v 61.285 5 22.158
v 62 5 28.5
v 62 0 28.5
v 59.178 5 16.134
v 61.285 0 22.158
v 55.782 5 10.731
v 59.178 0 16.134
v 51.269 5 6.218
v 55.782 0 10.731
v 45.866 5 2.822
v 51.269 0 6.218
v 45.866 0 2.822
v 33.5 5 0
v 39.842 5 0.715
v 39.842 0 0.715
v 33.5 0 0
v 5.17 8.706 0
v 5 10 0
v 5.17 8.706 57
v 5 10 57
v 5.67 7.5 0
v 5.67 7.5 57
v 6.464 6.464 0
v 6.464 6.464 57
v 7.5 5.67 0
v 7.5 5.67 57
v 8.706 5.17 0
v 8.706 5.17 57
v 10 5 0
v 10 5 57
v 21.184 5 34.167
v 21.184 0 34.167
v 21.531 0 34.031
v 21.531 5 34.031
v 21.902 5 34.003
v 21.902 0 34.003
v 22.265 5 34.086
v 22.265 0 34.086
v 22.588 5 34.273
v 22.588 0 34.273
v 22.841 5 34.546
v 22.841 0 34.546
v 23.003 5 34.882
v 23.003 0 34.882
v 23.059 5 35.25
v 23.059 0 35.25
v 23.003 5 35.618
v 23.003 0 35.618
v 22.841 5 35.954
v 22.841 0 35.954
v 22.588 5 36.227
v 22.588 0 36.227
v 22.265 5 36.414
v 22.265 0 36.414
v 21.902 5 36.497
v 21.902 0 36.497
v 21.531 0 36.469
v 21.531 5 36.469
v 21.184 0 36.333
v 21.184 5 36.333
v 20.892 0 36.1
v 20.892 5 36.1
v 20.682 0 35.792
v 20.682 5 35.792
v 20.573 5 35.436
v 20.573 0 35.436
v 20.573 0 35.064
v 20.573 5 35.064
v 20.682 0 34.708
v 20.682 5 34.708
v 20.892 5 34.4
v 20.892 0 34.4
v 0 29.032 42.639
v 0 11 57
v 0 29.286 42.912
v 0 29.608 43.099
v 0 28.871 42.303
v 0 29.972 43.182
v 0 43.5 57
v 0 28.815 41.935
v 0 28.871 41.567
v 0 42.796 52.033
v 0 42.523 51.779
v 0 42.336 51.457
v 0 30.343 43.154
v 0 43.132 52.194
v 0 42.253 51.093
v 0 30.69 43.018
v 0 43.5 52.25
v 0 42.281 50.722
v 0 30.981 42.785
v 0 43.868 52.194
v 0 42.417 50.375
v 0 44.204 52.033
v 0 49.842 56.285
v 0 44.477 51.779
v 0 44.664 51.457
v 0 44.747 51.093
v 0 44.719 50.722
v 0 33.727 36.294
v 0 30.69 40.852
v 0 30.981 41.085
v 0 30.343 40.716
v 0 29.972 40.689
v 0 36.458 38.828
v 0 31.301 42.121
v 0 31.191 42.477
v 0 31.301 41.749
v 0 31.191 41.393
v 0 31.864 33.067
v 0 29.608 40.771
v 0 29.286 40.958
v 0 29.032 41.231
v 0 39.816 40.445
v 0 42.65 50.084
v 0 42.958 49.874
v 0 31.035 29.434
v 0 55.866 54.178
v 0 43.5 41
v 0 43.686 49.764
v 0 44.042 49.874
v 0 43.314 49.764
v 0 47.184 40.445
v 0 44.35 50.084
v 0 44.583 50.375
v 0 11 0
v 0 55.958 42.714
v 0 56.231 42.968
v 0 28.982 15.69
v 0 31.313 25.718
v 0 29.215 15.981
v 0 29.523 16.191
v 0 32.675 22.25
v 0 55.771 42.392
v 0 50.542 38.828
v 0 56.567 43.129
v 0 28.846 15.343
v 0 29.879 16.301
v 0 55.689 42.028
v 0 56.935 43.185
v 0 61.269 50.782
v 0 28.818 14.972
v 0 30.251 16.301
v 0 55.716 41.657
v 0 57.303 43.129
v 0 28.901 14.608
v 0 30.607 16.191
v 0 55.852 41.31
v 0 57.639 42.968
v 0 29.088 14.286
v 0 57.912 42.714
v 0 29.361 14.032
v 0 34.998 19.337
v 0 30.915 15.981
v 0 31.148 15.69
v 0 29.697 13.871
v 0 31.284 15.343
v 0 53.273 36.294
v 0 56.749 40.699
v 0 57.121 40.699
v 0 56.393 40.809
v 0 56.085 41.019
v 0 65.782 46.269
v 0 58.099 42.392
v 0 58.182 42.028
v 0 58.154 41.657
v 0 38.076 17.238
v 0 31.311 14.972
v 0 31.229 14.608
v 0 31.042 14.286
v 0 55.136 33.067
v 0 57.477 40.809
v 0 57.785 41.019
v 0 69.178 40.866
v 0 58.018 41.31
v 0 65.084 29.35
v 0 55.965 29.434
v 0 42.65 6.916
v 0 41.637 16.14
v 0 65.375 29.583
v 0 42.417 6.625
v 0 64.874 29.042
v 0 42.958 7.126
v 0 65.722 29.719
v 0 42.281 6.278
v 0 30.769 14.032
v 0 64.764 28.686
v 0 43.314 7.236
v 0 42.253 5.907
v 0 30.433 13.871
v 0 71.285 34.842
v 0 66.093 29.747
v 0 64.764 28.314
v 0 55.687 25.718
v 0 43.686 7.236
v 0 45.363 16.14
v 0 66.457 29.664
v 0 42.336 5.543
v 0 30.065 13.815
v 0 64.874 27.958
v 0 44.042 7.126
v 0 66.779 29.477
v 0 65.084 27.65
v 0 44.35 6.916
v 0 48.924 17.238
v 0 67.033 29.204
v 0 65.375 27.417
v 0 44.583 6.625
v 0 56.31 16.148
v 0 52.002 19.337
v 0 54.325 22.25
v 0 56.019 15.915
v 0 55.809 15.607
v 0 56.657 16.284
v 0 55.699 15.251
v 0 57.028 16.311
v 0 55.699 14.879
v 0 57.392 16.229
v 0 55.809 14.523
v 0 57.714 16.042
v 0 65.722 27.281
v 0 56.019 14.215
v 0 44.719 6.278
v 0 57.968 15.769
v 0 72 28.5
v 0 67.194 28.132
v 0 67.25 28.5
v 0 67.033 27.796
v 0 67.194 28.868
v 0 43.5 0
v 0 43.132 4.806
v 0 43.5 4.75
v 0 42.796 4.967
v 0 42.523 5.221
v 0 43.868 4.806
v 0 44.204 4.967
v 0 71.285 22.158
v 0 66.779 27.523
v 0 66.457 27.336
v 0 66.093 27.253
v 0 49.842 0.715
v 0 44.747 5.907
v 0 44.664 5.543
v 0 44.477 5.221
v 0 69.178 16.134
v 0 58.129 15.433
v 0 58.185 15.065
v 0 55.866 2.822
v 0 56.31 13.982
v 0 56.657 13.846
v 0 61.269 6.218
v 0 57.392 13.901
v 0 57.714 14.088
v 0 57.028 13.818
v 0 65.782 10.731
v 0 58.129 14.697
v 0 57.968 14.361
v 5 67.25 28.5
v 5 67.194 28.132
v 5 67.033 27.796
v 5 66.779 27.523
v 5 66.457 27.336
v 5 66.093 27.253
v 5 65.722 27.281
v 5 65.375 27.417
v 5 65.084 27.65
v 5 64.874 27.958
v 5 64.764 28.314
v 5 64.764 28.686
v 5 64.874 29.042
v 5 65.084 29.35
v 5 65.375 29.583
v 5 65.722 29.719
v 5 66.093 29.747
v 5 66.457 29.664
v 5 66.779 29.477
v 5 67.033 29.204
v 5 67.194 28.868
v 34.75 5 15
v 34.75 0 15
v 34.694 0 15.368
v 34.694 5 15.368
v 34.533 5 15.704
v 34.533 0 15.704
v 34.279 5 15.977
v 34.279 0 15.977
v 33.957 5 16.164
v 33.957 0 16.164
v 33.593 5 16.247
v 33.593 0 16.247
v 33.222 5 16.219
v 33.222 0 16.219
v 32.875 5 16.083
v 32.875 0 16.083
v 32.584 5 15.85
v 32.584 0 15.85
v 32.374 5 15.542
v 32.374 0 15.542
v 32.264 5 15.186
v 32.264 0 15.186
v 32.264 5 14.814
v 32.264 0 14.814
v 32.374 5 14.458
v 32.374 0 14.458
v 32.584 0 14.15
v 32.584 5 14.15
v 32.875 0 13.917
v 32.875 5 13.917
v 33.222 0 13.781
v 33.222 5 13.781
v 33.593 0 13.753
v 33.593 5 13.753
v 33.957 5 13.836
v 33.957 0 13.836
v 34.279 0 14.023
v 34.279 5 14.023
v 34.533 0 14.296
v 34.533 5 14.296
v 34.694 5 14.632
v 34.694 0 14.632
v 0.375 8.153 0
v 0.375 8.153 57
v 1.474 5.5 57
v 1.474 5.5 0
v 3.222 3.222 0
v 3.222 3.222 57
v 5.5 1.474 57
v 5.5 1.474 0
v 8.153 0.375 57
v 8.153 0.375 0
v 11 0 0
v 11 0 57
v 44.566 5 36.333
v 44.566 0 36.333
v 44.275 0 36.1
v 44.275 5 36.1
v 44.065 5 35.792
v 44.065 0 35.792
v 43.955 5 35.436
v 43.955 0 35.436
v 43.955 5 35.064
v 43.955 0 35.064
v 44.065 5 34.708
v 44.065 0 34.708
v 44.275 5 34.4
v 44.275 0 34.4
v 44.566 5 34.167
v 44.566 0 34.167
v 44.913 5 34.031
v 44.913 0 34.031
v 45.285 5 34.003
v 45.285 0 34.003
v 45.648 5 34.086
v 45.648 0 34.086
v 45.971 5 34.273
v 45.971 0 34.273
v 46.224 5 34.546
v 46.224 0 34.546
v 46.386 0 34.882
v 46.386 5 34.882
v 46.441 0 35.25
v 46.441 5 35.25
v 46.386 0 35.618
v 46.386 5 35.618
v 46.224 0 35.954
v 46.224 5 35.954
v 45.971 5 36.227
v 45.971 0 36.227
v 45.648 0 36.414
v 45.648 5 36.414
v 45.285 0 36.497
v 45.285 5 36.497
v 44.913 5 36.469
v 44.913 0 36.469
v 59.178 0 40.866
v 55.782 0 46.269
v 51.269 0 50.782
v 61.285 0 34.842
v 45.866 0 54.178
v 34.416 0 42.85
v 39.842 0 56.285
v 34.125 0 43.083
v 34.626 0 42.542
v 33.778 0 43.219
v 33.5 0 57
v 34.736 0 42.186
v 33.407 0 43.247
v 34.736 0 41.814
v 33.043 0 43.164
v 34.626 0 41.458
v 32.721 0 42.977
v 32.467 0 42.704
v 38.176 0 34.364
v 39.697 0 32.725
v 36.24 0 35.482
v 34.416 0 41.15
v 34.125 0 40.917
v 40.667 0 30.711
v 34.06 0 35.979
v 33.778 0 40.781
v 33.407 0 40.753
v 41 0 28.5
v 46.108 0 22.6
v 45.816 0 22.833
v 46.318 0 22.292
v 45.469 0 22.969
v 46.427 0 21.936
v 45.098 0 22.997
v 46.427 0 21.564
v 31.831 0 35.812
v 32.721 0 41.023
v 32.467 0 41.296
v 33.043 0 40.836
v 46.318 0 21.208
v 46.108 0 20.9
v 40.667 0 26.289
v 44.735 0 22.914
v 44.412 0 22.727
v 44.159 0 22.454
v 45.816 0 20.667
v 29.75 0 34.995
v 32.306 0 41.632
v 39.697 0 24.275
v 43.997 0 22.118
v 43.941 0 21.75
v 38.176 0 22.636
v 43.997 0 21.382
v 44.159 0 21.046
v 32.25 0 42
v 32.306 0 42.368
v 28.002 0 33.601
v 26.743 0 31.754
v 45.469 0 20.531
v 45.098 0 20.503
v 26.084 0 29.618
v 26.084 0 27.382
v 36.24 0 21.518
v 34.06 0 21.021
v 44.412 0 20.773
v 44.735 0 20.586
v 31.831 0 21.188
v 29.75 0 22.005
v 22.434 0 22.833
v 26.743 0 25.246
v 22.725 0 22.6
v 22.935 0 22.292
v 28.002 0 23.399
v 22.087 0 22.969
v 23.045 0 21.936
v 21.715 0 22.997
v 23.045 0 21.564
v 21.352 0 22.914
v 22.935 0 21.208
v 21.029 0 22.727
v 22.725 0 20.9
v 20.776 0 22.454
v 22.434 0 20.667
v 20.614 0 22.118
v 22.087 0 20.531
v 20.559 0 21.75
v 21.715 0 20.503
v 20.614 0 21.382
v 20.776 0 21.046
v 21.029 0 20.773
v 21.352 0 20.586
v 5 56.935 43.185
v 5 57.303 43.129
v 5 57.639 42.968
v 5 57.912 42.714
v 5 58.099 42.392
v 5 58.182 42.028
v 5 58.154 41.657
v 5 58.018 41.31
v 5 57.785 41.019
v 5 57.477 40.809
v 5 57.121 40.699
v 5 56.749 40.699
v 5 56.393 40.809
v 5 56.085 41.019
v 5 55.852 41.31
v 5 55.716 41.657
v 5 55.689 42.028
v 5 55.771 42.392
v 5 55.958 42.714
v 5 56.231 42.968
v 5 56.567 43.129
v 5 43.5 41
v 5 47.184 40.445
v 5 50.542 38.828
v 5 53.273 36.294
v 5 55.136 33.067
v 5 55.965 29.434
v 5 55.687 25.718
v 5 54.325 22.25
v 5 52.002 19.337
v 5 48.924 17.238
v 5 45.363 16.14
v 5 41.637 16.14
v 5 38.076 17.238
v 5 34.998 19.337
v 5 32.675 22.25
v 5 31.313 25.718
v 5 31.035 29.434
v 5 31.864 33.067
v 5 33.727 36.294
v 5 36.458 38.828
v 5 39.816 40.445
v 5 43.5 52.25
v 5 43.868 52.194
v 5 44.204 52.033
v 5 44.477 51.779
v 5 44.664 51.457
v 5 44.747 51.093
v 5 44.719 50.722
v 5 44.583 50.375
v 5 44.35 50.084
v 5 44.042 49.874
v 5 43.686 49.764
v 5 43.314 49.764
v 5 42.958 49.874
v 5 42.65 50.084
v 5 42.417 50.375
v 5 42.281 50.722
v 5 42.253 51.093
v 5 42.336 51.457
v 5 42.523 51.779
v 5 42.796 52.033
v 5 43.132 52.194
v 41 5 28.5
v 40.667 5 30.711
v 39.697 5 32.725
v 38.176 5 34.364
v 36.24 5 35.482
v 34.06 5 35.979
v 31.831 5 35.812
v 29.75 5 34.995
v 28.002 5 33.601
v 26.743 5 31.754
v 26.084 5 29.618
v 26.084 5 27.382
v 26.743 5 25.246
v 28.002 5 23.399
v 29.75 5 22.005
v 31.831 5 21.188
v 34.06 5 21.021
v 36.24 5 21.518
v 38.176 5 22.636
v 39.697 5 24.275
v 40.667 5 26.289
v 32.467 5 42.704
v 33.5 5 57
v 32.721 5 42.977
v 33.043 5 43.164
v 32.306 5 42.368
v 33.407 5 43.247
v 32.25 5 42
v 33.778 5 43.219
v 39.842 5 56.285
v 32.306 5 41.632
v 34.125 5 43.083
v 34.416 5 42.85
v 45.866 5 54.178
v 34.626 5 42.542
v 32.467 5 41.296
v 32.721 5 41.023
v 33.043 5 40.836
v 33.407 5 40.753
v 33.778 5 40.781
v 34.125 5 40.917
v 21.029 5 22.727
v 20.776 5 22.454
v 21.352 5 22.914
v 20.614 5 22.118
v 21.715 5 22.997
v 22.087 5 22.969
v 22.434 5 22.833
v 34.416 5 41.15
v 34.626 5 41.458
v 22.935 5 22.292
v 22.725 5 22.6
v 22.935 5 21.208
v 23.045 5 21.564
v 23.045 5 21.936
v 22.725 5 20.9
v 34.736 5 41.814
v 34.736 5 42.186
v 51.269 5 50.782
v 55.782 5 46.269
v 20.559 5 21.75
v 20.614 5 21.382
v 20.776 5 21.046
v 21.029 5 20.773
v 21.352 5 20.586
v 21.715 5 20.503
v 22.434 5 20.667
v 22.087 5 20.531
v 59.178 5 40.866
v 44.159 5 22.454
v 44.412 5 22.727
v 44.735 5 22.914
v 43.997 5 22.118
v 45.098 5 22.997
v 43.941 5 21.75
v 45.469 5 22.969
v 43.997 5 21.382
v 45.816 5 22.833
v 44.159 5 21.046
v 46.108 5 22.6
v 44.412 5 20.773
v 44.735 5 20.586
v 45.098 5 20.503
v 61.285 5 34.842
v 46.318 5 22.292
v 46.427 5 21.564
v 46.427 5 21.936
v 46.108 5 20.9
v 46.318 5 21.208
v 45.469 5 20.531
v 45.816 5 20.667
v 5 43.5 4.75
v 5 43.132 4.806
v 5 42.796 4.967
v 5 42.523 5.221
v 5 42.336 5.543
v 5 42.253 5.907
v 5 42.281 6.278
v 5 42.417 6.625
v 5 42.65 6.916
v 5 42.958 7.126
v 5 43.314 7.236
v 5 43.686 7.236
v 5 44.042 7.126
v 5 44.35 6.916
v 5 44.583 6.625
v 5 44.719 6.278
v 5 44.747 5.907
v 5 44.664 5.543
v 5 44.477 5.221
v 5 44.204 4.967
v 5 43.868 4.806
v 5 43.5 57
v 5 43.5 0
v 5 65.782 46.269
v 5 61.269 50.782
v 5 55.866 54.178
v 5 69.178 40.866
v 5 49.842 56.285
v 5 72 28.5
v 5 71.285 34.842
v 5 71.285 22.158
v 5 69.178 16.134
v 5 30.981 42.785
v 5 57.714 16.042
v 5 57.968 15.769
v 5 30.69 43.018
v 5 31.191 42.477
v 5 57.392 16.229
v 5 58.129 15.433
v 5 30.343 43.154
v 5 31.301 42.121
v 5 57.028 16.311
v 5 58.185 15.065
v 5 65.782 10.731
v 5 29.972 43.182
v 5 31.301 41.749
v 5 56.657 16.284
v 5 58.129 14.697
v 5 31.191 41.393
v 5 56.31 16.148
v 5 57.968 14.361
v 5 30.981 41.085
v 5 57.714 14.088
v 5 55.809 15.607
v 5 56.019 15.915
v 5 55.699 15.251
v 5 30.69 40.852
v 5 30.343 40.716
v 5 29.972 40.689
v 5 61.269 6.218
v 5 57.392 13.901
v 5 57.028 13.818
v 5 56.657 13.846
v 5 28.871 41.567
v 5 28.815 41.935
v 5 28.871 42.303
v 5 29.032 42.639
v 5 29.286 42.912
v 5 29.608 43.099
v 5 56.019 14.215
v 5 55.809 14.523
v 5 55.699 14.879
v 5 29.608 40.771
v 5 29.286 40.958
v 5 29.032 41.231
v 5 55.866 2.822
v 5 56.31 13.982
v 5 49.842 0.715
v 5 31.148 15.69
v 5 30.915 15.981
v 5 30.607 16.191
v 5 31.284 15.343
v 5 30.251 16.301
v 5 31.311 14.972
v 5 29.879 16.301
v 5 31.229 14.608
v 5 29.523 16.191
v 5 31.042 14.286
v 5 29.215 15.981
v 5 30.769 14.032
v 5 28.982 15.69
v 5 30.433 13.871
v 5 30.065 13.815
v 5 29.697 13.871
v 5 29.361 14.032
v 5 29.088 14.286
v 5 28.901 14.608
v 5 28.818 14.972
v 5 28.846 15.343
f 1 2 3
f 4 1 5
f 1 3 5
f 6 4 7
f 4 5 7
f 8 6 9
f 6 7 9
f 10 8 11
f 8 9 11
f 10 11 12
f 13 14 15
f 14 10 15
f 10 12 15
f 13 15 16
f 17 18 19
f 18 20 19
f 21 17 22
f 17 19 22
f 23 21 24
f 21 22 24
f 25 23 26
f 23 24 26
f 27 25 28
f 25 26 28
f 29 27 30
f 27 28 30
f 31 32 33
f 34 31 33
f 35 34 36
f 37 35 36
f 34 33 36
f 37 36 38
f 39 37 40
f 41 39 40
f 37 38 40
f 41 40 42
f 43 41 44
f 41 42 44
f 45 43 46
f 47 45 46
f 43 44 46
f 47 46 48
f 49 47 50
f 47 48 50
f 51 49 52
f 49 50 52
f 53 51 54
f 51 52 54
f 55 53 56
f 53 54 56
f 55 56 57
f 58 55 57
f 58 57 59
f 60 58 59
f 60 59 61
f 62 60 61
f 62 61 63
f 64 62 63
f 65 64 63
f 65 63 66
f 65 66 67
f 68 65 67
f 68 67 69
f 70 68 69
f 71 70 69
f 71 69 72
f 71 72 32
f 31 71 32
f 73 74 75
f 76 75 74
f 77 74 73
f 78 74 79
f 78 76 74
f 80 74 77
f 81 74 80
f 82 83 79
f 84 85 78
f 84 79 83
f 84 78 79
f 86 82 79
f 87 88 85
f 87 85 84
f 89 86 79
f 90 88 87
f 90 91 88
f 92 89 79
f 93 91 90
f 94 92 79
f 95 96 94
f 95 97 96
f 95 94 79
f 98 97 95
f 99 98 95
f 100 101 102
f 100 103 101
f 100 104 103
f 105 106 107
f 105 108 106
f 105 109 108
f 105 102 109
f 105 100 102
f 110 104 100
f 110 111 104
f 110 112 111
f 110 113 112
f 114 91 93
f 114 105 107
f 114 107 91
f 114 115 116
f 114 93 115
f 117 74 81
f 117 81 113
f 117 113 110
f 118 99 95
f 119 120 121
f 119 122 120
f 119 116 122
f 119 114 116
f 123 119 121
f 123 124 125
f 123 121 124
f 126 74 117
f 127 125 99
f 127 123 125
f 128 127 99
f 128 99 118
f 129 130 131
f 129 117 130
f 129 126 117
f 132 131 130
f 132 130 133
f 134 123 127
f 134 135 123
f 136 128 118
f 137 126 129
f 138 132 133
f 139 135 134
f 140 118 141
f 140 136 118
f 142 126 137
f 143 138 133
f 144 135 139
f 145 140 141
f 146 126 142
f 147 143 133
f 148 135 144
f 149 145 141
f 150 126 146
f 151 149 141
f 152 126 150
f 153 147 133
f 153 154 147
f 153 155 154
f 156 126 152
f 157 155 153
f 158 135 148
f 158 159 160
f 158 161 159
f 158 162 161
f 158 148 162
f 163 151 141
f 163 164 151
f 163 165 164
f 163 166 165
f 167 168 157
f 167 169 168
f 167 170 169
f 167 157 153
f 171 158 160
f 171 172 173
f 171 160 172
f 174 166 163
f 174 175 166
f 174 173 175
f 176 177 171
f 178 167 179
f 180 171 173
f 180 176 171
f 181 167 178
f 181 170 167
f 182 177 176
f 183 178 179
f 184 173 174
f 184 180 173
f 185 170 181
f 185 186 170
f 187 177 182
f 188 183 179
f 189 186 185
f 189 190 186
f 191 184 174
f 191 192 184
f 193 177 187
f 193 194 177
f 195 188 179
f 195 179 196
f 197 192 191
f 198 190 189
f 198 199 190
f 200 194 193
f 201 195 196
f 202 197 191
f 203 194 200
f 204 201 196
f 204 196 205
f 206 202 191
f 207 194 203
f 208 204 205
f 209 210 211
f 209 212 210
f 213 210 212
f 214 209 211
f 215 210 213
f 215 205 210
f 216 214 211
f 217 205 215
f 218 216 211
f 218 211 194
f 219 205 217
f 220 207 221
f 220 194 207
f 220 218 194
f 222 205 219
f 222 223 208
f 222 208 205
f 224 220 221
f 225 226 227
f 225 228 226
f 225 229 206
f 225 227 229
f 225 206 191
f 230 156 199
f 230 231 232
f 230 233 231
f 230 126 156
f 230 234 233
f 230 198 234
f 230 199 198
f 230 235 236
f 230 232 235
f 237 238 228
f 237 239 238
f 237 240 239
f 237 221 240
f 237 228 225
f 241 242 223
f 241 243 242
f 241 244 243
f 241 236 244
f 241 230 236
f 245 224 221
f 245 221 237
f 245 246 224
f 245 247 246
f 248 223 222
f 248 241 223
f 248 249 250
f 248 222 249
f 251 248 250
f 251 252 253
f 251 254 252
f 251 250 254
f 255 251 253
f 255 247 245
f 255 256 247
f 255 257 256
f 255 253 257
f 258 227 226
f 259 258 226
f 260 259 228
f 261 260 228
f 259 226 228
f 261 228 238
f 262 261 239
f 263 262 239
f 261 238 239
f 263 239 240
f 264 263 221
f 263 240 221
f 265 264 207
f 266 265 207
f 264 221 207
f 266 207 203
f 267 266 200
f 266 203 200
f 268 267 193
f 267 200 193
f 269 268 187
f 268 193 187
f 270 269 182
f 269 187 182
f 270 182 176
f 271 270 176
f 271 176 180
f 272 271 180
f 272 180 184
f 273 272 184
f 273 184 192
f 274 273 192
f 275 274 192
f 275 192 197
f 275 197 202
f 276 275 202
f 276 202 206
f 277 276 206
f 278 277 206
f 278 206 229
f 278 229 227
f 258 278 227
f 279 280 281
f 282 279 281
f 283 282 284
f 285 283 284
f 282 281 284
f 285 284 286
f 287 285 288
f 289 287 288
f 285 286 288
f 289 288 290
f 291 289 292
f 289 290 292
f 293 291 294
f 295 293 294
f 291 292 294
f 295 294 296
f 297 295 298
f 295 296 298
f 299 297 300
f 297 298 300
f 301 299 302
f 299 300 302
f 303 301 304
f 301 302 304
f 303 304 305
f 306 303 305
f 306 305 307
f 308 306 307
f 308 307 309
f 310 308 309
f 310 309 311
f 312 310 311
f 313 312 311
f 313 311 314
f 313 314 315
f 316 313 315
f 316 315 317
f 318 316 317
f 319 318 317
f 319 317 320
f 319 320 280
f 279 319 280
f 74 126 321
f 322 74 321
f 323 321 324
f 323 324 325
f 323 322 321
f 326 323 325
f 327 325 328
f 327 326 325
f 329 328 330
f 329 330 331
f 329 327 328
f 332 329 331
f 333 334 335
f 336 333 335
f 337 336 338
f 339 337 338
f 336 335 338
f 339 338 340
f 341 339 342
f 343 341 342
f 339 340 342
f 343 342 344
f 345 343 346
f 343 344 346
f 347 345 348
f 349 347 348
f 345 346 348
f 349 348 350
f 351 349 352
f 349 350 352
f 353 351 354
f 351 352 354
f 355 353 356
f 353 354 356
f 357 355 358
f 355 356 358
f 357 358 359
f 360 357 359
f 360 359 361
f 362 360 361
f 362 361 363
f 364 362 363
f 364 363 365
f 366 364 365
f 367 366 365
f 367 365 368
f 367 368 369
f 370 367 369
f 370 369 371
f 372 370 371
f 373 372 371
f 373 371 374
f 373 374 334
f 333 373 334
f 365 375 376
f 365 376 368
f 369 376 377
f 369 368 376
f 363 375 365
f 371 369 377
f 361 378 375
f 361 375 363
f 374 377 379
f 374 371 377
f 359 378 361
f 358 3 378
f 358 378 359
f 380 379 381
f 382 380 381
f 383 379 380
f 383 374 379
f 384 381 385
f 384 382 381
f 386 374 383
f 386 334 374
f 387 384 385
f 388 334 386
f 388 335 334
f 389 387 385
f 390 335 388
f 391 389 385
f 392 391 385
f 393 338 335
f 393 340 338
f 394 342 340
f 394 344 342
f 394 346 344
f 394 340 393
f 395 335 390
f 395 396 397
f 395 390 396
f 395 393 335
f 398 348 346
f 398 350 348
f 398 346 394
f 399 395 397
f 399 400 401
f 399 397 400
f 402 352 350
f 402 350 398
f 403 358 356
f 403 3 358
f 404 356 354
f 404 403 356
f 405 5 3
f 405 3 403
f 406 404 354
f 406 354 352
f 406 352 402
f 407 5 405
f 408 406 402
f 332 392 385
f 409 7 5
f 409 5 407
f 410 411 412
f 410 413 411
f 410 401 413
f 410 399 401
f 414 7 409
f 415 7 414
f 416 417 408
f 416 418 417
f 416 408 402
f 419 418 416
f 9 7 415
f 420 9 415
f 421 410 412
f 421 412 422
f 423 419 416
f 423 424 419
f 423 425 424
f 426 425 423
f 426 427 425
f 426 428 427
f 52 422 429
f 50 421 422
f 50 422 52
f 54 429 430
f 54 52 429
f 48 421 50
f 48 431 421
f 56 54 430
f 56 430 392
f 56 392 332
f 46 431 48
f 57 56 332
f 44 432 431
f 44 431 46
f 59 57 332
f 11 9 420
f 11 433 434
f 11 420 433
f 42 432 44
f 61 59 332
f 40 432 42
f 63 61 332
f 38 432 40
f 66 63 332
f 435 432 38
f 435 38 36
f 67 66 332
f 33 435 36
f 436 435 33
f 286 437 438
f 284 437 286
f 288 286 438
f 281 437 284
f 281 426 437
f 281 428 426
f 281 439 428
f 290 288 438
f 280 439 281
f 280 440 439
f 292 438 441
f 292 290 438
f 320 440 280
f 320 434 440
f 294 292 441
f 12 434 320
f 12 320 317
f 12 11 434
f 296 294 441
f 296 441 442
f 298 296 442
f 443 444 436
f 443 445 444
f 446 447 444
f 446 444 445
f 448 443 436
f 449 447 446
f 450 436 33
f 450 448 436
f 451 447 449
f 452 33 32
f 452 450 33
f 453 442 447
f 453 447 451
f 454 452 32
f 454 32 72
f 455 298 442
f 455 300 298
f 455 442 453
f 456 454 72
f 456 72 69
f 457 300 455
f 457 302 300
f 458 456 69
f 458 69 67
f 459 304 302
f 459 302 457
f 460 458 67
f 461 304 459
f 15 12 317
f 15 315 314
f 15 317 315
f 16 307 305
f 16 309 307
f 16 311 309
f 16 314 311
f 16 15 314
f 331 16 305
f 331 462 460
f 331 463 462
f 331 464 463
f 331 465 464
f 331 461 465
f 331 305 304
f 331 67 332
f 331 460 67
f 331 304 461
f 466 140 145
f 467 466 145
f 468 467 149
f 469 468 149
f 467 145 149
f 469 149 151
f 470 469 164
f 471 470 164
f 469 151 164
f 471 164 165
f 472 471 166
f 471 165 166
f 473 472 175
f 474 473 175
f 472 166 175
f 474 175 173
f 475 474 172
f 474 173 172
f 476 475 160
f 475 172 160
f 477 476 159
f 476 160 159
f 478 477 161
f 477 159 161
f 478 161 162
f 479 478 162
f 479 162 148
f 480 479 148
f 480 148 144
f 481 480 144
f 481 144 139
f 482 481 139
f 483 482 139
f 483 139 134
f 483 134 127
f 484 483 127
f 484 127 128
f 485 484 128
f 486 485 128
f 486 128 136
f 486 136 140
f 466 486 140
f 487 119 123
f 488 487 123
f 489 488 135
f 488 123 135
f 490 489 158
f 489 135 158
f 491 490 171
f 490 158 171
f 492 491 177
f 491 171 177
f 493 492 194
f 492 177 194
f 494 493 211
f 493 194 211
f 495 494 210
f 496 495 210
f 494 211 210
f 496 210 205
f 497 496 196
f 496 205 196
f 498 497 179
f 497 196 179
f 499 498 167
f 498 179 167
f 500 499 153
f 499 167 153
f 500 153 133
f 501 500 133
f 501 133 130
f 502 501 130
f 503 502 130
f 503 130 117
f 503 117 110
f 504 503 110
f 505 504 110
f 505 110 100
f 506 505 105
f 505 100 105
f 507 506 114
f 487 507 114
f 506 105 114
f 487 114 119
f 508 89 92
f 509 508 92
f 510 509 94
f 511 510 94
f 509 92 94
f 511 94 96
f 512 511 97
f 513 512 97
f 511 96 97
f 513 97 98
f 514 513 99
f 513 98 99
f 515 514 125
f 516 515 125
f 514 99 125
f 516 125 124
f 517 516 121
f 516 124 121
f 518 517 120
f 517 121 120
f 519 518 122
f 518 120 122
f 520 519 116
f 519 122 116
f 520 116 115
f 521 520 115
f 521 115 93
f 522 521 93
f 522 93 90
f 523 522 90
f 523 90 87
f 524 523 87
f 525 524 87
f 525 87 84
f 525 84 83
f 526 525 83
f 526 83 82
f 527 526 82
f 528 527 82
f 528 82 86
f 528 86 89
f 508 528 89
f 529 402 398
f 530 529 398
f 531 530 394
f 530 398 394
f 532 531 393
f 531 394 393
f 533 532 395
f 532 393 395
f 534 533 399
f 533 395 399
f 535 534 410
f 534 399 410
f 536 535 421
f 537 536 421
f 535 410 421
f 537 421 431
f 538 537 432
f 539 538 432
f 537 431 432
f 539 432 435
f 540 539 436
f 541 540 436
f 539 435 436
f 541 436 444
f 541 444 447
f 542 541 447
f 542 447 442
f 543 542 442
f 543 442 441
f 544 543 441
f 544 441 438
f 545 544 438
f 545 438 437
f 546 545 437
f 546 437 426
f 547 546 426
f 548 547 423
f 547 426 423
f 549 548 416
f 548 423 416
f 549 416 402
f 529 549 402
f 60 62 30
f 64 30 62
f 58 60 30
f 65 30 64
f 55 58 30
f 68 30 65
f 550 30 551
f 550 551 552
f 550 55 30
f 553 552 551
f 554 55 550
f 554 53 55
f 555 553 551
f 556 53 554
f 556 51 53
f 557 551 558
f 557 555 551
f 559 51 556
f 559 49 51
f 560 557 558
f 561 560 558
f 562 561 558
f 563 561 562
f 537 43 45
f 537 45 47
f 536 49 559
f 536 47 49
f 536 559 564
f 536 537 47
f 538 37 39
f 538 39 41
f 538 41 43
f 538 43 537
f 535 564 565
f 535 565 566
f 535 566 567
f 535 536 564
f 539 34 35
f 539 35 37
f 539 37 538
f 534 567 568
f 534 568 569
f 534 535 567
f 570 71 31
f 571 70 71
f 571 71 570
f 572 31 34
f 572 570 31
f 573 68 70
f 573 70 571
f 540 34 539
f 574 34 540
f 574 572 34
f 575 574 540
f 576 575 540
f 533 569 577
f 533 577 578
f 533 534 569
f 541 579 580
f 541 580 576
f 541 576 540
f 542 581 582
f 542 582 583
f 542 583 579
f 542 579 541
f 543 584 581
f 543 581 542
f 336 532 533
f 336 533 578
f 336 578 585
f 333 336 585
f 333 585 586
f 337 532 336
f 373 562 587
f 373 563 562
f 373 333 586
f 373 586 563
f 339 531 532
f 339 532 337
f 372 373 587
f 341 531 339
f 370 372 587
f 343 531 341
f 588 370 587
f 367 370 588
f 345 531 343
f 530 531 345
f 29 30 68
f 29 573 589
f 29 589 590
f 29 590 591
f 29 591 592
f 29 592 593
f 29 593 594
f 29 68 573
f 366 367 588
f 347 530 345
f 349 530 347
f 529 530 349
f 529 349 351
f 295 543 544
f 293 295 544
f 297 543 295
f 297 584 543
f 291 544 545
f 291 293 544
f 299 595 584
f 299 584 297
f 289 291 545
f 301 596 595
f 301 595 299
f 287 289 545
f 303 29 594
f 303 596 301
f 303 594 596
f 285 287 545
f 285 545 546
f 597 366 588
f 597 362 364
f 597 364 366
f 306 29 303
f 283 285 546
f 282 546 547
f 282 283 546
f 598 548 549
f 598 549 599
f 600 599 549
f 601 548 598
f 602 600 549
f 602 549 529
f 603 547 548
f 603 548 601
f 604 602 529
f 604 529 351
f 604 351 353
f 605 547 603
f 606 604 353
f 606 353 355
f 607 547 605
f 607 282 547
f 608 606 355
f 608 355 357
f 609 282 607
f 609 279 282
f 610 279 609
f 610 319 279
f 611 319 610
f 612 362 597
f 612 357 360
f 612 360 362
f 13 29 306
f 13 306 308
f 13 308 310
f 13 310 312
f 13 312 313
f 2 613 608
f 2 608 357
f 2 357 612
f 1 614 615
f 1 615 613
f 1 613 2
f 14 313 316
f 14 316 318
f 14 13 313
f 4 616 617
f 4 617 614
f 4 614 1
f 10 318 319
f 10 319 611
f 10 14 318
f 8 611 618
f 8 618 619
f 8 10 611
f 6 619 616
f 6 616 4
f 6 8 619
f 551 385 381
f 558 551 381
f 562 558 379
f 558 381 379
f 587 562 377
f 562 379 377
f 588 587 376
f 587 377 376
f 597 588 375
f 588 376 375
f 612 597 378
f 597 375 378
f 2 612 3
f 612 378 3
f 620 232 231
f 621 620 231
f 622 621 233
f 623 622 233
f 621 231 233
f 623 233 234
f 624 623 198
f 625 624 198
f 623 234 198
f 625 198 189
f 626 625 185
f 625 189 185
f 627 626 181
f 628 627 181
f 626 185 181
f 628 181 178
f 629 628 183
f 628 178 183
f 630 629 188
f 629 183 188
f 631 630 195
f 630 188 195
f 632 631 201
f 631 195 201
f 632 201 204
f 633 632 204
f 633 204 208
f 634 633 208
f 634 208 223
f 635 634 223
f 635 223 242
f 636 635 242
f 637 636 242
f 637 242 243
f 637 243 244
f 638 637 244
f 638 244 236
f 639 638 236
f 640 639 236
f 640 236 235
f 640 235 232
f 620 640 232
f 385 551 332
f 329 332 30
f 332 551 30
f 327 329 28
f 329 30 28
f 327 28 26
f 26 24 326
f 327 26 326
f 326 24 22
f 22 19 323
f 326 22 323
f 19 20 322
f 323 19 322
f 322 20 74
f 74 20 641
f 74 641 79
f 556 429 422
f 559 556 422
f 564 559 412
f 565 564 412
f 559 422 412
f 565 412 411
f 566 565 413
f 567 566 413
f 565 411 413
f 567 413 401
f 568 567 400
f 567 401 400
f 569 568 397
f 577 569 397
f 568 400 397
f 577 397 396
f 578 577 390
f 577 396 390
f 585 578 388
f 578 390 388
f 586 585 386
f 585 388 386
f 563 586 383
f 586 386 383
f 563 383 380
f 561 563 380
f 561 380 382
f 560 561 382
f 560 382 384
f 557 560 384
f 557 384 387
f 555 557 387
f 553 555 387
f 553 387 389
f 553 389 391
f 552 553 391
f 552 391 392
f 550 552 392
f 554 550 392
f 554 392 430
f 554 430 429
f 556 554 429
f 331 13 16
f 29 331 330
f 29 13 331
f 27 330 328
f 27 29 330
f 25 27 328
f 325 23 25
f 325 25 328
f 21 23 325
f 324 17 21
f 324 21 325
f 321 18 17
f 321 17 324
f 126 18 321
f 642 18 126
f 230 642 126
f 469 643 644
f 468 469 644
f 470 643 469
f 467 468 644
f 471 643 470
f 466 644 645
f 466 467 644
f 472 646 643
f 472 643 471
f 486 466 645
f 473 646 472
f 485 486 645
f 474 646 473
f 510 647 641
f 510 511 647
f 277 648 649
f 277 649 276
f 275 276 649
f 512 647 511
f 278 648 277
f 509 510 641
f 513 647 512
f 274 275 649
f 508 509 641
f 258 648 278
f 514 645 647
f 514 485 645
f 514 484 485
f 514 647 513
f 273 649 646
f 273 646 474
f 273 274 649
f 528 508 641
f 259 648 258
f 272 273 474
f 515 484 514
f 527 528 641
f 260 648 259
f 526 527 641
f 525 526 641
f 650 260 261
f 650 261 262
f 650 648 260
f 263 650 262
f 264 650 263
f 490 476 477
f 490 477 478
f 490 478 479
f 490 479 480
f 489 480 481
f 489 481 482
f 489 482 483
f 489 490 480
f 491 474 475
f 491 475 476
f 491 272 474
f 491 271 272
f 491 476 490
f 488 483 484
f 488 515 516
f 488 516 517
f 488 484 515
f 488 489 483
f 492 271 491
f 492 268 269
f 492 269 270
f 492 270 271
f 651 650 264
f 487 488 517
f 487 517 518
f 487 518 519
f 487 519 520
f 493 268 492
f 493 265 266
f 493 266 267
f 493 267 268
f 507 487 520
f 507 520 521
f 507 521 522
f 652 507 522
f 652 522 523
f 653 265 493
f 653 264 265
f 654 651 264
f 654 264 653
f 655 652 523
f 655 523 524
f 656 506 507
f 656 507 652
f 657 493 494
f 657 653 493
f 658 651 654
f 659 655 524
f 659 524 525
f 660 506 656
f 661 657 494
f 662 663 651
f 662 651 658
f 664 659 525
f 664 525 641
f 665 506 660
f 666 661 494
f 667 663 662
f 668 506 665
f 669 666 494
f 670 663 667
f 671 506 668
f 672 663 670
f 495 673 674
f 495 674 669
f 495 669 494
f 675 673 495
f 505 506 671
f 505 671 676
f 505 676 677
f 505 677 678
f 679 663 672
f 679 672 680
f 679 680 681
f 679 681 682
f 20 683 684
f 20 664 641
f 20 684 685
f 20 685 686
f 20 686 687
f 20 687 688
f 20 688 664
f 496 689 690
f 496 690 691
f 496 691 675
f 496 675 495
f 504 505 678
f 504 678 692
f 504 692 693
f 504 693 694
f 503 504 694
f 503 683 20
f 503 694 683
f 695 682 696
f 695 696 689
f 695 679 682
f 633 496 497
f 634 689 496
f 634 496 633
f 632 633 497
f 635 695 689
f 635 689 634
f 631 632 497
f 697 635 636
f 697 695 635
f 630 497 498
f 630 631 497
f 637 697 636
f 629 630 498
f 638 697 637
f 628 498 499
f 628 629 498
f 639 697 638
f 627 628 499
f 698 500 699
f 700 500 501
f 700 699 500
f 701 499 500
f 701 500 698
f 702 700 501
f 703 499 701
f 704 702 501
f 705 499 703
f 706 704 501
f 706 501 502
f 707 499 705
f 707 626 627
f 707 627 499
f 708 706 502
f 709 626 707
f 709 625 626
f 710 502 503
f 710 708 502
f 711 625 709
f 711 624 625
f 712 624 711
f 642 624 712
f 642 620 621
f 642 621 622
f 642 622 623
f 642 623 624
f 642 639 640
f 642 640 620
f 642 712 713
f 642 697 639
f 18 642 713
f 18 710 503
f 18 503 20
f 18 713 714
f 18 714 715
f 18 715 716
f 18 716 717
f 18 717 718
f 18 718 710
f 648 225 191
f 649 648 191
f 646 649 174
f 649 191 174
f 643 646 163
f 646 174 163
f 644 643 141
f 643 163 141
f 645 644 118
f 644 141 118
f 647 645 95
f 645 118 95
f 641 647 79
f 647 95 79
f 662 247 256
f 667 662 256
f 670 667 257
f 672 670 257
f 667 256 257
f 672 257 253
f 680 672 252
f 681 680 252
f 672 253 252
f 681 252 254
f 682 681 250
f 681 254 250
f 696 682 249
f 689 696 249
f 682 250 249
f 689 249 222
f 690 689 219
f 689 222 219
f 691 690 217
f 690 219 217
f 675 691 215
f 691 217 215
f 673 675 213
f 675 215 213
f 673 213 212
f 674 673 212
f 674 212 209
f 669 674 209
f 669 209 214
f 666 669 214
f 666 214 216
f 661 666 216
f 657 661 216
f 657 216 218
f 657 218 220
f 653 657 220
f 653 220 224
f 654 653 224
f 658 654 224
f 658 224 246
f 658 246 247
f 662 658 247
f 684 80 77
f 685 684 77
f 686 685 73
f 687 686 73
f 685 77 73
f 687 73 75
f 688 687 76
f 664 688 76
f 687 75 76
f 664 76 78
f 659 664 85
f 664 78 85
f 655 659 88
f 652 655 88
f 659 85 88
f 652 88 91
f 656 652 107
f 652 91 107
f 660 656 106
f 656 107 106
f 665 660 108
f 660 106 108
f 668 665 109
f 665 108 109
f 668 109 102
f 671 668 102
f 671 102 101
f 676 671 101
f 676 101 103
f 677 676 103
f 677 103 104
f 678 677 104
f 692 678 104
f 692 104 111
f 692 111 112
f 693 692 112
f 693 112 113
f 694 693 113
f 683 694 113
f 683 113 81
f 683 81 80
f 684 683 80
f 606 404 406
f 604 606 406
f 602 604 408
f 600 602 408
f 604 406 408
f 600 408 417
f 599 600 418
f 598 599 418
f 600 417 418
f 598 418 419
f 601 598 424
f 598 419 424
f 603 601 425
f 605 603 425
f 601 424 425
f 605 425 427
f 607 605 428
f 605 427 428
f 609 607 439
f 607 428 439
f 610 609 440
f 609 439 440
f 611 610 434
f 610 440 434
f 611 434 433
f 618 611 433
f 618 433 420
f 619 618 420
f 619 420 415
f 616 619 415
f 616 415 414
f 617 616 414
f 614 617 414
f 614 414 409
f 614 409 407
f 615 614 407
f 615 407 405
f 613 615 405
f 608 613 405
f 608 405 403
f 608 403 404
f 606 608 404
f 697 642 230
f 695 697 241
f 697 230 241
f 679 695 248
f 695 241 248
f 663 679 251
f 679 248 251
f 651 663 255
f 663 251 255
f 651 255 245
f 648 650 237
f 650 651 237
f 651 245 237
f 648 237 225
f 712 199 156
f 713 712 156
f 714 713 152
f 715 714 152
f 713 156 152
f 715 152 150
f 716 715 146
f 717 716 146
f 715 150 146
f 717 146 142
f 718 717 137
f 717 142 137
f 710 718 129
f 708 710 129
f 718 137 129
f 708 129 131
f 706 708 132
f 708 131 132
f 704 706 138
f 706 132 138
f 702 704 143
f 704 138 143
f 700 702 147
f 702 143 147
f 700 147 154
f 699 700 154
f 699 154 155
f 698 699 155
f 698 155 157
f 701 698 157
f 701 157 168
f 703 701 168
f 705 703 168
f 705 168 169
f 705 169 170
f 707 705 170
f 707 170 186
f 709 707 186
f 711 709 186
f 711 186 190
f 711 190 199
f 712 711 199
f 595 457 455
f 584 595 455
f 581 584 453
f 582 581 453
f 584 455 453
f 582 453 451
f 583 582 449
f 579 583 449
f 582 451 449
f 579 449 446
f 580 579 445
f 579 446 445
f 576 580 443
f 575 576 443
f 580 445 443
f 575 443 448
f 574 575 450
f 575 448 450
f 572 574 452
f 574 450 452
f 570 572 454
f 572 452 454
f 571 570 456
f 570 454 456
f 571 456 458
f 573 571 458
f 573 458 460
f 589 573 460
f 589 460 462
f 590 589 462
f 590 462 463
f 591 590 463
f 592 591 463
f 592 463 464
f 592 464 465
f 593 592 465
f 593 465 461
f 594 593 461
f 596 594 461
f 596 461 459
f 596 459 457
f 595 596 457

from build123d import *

# Parameters (mm, degrees)
EXTRUDE_1_DEPTH          = 57
CUT_EXTRUDE_1_DEPTH      = 57
CUT_EXTRUDE_2_DEPTH      = 57
FILLET_3_R               = 11
FILLET_4_R               = 5
SKETCH_4_R               = 12.5
SKETCH_4_R_2             = 1.25
CUT_EXTRUDE_3_DEPTH      = 57
PATTERN_CIRCULAR_1_COUNT = 4
SKETCH_5_R               = 1.25
CUT_EXTRUDE_4_DEPTH      = 57
PATTERN_CIRCULAR_2_COUNT = 3
PATTERN_CIRCULAR_2_ANGLE = 180
SKETCH_8_R               = 7.5
SKETCH_8_R_2             = 1.25
CUT_EXTRUDE_6_DEPTH      = 57
PATTERN_CIRCULAR_3_COUNT = 6


with BuildPart() as part:
    # 草图1 → 凸台-拉伸1 (new body)
    with BuildSketch(Plane.XY):
        Polygon((0, 0), (0, 72), (5, 72), (5, 5), (62, 5), (62, 0), align=None)
    extrude(amount=EXTRUDE_1_DEPTH)

    # 草图2 → 切除-拉伸1 (cut)
    with BuildSketch(Plane.ZY):
        with BuildLine():
            Line((57, 43.5), (57, 72))
            Line((57, 72), (28.5, 72))
            ThreePointArc((28.5, 72), (48.652543264, 63.652543264), (57, 43.5))
        make_face()
        with BuildLine():
            ThreePointArc((0, 43.5), (8.347456736, 63.652543264), (28.5, 72))
            Line((28.5, 72), (0, 72))
            Line((0, 72), (0, 43.5))
        make_face()
    extrude(amount=-CUT_EXTRUDE_1_DEPTH, mode=Mode.SUBTRACT)

    # 草图3 → 切除-拉伸2 (cut)
    with BuildSketch(Plane.XZ):
        with BuildLine():
            Line((62, 57), (33.5, 57))
            ThreePointArc((33.5, 57), (53.652543264, 48.652543264), (62, 28.5))
            Line((62, 28.5), (62, 57))
        make_face()
        with BuildLine():
            ThreePointArc((62, 28.5), (53.652543264, 8.347456736), (33.5, 0))
            Line((33.5, 0), (62, 0))
            Line((62, 0), (62, 28.5))
        make_face()
    extrude(amount=-CUT_EXTRUDE_2_DEPTH, mode=Mode.SUBTRACT)

    # 圆角3
    fillet_3_edges = [part.edges().sort_by_distance(p)[0] for p in [
        (0, 0, 28.5),
    ]]
    fillet(fillet_3_edges, radius=FILLET_3_R)

    # 圆角4
    fillet_4_edges = [part.edges().sort_by_distance(p)[0] for p in [
        (5, 5, 28.5),
    ]]
    fillet(fillet_4_edges, radius=FILLET_4_R)

    # 草图4 → 切除-拉伸3 (cut)
    with BuildSketch(Plane.ZY):
        with Locations((28.5, 43.5)):
            Circle(SKETCH_4_R)
        with Locations((41.935028843, 56.935028843)):
            Circle(SKETCH_4_R_2)
    cut_extrude_3 = extrude(amount=-CUT_EXTRUDE_3_DEPTH, mode=Mode.SUBTRACT)

    # 阵列(圆周)1: 切除-拉伸3 ×4 about axis
    pattern_circular_1_axis = Axis((0, 43.5, 28.5), (1, 0, 0))
    for i in range(1, PATTERN_CIRCULAR_1_COUNT):
        add(cut_extrude_3.rotate(pattern_circular_1_axis, i * 360 / PATTERN_CIRCULAR_1_COUNT), mode=Mode.SUBTRACT)

    # 草图5 → 切除-拉伸4 (cut)
    with BuildSketch(Plane.ZY):
        with Locations((51, 43.5)):
            Circle(SKETCH_5_R)
    cut_extrude_4 = extrude(amount=-CUT_EXTRUDE_4_DEPTH, mode=Mode.SUBTRACT)

    # 阵列(圆周)2: 切除-拉伸4 ×3 about axis
    pattern_circular_2_axis = Axis((0, 43.5, 28.5), (-1, 0, 0))
    for i in range(1, PATTERN_CIRCULAR_2_COUNT):
        add(cut_extrude_4.rotate(pattern_circular_2_axis, i * PATTERN_CIRCULAR_2_ANGLE / (PATTERN_CIRCULAR_2_COUNT - 1)), mode=Mode.SUBTRACT)

    # 草图8 → 切除-拉伸6 (cut)
    with BuildSketch(Plane.XZ):
        with Locations((33.5, 28.5)):
            Circle(SKETCH_8_R)
        with Locations((33.5, 15)):
            Circle(SKETCH_8_R_2)
    cut_extrude_6 = extrude(amount=-CUT_EXTRUDE_6_DEPTH, mode=Mode.SUBTRACT)

    # 阵列(圆周)3: 切除-拉伸6 ×6 about axis
    pattern_circular_3_axis = Axis((33.5, 0, 28.5), (0, 1, 0))
    for i in range(1, PATTERN_CIRCULAR_3_COUNT):
        add(cut_extrude_6.rotate(pattern_circular_3_axis, i * 360 / PATTERN_CIRCULAR_3_COUNT), mode=Mode.SUBTRACT)


solid = part.part
